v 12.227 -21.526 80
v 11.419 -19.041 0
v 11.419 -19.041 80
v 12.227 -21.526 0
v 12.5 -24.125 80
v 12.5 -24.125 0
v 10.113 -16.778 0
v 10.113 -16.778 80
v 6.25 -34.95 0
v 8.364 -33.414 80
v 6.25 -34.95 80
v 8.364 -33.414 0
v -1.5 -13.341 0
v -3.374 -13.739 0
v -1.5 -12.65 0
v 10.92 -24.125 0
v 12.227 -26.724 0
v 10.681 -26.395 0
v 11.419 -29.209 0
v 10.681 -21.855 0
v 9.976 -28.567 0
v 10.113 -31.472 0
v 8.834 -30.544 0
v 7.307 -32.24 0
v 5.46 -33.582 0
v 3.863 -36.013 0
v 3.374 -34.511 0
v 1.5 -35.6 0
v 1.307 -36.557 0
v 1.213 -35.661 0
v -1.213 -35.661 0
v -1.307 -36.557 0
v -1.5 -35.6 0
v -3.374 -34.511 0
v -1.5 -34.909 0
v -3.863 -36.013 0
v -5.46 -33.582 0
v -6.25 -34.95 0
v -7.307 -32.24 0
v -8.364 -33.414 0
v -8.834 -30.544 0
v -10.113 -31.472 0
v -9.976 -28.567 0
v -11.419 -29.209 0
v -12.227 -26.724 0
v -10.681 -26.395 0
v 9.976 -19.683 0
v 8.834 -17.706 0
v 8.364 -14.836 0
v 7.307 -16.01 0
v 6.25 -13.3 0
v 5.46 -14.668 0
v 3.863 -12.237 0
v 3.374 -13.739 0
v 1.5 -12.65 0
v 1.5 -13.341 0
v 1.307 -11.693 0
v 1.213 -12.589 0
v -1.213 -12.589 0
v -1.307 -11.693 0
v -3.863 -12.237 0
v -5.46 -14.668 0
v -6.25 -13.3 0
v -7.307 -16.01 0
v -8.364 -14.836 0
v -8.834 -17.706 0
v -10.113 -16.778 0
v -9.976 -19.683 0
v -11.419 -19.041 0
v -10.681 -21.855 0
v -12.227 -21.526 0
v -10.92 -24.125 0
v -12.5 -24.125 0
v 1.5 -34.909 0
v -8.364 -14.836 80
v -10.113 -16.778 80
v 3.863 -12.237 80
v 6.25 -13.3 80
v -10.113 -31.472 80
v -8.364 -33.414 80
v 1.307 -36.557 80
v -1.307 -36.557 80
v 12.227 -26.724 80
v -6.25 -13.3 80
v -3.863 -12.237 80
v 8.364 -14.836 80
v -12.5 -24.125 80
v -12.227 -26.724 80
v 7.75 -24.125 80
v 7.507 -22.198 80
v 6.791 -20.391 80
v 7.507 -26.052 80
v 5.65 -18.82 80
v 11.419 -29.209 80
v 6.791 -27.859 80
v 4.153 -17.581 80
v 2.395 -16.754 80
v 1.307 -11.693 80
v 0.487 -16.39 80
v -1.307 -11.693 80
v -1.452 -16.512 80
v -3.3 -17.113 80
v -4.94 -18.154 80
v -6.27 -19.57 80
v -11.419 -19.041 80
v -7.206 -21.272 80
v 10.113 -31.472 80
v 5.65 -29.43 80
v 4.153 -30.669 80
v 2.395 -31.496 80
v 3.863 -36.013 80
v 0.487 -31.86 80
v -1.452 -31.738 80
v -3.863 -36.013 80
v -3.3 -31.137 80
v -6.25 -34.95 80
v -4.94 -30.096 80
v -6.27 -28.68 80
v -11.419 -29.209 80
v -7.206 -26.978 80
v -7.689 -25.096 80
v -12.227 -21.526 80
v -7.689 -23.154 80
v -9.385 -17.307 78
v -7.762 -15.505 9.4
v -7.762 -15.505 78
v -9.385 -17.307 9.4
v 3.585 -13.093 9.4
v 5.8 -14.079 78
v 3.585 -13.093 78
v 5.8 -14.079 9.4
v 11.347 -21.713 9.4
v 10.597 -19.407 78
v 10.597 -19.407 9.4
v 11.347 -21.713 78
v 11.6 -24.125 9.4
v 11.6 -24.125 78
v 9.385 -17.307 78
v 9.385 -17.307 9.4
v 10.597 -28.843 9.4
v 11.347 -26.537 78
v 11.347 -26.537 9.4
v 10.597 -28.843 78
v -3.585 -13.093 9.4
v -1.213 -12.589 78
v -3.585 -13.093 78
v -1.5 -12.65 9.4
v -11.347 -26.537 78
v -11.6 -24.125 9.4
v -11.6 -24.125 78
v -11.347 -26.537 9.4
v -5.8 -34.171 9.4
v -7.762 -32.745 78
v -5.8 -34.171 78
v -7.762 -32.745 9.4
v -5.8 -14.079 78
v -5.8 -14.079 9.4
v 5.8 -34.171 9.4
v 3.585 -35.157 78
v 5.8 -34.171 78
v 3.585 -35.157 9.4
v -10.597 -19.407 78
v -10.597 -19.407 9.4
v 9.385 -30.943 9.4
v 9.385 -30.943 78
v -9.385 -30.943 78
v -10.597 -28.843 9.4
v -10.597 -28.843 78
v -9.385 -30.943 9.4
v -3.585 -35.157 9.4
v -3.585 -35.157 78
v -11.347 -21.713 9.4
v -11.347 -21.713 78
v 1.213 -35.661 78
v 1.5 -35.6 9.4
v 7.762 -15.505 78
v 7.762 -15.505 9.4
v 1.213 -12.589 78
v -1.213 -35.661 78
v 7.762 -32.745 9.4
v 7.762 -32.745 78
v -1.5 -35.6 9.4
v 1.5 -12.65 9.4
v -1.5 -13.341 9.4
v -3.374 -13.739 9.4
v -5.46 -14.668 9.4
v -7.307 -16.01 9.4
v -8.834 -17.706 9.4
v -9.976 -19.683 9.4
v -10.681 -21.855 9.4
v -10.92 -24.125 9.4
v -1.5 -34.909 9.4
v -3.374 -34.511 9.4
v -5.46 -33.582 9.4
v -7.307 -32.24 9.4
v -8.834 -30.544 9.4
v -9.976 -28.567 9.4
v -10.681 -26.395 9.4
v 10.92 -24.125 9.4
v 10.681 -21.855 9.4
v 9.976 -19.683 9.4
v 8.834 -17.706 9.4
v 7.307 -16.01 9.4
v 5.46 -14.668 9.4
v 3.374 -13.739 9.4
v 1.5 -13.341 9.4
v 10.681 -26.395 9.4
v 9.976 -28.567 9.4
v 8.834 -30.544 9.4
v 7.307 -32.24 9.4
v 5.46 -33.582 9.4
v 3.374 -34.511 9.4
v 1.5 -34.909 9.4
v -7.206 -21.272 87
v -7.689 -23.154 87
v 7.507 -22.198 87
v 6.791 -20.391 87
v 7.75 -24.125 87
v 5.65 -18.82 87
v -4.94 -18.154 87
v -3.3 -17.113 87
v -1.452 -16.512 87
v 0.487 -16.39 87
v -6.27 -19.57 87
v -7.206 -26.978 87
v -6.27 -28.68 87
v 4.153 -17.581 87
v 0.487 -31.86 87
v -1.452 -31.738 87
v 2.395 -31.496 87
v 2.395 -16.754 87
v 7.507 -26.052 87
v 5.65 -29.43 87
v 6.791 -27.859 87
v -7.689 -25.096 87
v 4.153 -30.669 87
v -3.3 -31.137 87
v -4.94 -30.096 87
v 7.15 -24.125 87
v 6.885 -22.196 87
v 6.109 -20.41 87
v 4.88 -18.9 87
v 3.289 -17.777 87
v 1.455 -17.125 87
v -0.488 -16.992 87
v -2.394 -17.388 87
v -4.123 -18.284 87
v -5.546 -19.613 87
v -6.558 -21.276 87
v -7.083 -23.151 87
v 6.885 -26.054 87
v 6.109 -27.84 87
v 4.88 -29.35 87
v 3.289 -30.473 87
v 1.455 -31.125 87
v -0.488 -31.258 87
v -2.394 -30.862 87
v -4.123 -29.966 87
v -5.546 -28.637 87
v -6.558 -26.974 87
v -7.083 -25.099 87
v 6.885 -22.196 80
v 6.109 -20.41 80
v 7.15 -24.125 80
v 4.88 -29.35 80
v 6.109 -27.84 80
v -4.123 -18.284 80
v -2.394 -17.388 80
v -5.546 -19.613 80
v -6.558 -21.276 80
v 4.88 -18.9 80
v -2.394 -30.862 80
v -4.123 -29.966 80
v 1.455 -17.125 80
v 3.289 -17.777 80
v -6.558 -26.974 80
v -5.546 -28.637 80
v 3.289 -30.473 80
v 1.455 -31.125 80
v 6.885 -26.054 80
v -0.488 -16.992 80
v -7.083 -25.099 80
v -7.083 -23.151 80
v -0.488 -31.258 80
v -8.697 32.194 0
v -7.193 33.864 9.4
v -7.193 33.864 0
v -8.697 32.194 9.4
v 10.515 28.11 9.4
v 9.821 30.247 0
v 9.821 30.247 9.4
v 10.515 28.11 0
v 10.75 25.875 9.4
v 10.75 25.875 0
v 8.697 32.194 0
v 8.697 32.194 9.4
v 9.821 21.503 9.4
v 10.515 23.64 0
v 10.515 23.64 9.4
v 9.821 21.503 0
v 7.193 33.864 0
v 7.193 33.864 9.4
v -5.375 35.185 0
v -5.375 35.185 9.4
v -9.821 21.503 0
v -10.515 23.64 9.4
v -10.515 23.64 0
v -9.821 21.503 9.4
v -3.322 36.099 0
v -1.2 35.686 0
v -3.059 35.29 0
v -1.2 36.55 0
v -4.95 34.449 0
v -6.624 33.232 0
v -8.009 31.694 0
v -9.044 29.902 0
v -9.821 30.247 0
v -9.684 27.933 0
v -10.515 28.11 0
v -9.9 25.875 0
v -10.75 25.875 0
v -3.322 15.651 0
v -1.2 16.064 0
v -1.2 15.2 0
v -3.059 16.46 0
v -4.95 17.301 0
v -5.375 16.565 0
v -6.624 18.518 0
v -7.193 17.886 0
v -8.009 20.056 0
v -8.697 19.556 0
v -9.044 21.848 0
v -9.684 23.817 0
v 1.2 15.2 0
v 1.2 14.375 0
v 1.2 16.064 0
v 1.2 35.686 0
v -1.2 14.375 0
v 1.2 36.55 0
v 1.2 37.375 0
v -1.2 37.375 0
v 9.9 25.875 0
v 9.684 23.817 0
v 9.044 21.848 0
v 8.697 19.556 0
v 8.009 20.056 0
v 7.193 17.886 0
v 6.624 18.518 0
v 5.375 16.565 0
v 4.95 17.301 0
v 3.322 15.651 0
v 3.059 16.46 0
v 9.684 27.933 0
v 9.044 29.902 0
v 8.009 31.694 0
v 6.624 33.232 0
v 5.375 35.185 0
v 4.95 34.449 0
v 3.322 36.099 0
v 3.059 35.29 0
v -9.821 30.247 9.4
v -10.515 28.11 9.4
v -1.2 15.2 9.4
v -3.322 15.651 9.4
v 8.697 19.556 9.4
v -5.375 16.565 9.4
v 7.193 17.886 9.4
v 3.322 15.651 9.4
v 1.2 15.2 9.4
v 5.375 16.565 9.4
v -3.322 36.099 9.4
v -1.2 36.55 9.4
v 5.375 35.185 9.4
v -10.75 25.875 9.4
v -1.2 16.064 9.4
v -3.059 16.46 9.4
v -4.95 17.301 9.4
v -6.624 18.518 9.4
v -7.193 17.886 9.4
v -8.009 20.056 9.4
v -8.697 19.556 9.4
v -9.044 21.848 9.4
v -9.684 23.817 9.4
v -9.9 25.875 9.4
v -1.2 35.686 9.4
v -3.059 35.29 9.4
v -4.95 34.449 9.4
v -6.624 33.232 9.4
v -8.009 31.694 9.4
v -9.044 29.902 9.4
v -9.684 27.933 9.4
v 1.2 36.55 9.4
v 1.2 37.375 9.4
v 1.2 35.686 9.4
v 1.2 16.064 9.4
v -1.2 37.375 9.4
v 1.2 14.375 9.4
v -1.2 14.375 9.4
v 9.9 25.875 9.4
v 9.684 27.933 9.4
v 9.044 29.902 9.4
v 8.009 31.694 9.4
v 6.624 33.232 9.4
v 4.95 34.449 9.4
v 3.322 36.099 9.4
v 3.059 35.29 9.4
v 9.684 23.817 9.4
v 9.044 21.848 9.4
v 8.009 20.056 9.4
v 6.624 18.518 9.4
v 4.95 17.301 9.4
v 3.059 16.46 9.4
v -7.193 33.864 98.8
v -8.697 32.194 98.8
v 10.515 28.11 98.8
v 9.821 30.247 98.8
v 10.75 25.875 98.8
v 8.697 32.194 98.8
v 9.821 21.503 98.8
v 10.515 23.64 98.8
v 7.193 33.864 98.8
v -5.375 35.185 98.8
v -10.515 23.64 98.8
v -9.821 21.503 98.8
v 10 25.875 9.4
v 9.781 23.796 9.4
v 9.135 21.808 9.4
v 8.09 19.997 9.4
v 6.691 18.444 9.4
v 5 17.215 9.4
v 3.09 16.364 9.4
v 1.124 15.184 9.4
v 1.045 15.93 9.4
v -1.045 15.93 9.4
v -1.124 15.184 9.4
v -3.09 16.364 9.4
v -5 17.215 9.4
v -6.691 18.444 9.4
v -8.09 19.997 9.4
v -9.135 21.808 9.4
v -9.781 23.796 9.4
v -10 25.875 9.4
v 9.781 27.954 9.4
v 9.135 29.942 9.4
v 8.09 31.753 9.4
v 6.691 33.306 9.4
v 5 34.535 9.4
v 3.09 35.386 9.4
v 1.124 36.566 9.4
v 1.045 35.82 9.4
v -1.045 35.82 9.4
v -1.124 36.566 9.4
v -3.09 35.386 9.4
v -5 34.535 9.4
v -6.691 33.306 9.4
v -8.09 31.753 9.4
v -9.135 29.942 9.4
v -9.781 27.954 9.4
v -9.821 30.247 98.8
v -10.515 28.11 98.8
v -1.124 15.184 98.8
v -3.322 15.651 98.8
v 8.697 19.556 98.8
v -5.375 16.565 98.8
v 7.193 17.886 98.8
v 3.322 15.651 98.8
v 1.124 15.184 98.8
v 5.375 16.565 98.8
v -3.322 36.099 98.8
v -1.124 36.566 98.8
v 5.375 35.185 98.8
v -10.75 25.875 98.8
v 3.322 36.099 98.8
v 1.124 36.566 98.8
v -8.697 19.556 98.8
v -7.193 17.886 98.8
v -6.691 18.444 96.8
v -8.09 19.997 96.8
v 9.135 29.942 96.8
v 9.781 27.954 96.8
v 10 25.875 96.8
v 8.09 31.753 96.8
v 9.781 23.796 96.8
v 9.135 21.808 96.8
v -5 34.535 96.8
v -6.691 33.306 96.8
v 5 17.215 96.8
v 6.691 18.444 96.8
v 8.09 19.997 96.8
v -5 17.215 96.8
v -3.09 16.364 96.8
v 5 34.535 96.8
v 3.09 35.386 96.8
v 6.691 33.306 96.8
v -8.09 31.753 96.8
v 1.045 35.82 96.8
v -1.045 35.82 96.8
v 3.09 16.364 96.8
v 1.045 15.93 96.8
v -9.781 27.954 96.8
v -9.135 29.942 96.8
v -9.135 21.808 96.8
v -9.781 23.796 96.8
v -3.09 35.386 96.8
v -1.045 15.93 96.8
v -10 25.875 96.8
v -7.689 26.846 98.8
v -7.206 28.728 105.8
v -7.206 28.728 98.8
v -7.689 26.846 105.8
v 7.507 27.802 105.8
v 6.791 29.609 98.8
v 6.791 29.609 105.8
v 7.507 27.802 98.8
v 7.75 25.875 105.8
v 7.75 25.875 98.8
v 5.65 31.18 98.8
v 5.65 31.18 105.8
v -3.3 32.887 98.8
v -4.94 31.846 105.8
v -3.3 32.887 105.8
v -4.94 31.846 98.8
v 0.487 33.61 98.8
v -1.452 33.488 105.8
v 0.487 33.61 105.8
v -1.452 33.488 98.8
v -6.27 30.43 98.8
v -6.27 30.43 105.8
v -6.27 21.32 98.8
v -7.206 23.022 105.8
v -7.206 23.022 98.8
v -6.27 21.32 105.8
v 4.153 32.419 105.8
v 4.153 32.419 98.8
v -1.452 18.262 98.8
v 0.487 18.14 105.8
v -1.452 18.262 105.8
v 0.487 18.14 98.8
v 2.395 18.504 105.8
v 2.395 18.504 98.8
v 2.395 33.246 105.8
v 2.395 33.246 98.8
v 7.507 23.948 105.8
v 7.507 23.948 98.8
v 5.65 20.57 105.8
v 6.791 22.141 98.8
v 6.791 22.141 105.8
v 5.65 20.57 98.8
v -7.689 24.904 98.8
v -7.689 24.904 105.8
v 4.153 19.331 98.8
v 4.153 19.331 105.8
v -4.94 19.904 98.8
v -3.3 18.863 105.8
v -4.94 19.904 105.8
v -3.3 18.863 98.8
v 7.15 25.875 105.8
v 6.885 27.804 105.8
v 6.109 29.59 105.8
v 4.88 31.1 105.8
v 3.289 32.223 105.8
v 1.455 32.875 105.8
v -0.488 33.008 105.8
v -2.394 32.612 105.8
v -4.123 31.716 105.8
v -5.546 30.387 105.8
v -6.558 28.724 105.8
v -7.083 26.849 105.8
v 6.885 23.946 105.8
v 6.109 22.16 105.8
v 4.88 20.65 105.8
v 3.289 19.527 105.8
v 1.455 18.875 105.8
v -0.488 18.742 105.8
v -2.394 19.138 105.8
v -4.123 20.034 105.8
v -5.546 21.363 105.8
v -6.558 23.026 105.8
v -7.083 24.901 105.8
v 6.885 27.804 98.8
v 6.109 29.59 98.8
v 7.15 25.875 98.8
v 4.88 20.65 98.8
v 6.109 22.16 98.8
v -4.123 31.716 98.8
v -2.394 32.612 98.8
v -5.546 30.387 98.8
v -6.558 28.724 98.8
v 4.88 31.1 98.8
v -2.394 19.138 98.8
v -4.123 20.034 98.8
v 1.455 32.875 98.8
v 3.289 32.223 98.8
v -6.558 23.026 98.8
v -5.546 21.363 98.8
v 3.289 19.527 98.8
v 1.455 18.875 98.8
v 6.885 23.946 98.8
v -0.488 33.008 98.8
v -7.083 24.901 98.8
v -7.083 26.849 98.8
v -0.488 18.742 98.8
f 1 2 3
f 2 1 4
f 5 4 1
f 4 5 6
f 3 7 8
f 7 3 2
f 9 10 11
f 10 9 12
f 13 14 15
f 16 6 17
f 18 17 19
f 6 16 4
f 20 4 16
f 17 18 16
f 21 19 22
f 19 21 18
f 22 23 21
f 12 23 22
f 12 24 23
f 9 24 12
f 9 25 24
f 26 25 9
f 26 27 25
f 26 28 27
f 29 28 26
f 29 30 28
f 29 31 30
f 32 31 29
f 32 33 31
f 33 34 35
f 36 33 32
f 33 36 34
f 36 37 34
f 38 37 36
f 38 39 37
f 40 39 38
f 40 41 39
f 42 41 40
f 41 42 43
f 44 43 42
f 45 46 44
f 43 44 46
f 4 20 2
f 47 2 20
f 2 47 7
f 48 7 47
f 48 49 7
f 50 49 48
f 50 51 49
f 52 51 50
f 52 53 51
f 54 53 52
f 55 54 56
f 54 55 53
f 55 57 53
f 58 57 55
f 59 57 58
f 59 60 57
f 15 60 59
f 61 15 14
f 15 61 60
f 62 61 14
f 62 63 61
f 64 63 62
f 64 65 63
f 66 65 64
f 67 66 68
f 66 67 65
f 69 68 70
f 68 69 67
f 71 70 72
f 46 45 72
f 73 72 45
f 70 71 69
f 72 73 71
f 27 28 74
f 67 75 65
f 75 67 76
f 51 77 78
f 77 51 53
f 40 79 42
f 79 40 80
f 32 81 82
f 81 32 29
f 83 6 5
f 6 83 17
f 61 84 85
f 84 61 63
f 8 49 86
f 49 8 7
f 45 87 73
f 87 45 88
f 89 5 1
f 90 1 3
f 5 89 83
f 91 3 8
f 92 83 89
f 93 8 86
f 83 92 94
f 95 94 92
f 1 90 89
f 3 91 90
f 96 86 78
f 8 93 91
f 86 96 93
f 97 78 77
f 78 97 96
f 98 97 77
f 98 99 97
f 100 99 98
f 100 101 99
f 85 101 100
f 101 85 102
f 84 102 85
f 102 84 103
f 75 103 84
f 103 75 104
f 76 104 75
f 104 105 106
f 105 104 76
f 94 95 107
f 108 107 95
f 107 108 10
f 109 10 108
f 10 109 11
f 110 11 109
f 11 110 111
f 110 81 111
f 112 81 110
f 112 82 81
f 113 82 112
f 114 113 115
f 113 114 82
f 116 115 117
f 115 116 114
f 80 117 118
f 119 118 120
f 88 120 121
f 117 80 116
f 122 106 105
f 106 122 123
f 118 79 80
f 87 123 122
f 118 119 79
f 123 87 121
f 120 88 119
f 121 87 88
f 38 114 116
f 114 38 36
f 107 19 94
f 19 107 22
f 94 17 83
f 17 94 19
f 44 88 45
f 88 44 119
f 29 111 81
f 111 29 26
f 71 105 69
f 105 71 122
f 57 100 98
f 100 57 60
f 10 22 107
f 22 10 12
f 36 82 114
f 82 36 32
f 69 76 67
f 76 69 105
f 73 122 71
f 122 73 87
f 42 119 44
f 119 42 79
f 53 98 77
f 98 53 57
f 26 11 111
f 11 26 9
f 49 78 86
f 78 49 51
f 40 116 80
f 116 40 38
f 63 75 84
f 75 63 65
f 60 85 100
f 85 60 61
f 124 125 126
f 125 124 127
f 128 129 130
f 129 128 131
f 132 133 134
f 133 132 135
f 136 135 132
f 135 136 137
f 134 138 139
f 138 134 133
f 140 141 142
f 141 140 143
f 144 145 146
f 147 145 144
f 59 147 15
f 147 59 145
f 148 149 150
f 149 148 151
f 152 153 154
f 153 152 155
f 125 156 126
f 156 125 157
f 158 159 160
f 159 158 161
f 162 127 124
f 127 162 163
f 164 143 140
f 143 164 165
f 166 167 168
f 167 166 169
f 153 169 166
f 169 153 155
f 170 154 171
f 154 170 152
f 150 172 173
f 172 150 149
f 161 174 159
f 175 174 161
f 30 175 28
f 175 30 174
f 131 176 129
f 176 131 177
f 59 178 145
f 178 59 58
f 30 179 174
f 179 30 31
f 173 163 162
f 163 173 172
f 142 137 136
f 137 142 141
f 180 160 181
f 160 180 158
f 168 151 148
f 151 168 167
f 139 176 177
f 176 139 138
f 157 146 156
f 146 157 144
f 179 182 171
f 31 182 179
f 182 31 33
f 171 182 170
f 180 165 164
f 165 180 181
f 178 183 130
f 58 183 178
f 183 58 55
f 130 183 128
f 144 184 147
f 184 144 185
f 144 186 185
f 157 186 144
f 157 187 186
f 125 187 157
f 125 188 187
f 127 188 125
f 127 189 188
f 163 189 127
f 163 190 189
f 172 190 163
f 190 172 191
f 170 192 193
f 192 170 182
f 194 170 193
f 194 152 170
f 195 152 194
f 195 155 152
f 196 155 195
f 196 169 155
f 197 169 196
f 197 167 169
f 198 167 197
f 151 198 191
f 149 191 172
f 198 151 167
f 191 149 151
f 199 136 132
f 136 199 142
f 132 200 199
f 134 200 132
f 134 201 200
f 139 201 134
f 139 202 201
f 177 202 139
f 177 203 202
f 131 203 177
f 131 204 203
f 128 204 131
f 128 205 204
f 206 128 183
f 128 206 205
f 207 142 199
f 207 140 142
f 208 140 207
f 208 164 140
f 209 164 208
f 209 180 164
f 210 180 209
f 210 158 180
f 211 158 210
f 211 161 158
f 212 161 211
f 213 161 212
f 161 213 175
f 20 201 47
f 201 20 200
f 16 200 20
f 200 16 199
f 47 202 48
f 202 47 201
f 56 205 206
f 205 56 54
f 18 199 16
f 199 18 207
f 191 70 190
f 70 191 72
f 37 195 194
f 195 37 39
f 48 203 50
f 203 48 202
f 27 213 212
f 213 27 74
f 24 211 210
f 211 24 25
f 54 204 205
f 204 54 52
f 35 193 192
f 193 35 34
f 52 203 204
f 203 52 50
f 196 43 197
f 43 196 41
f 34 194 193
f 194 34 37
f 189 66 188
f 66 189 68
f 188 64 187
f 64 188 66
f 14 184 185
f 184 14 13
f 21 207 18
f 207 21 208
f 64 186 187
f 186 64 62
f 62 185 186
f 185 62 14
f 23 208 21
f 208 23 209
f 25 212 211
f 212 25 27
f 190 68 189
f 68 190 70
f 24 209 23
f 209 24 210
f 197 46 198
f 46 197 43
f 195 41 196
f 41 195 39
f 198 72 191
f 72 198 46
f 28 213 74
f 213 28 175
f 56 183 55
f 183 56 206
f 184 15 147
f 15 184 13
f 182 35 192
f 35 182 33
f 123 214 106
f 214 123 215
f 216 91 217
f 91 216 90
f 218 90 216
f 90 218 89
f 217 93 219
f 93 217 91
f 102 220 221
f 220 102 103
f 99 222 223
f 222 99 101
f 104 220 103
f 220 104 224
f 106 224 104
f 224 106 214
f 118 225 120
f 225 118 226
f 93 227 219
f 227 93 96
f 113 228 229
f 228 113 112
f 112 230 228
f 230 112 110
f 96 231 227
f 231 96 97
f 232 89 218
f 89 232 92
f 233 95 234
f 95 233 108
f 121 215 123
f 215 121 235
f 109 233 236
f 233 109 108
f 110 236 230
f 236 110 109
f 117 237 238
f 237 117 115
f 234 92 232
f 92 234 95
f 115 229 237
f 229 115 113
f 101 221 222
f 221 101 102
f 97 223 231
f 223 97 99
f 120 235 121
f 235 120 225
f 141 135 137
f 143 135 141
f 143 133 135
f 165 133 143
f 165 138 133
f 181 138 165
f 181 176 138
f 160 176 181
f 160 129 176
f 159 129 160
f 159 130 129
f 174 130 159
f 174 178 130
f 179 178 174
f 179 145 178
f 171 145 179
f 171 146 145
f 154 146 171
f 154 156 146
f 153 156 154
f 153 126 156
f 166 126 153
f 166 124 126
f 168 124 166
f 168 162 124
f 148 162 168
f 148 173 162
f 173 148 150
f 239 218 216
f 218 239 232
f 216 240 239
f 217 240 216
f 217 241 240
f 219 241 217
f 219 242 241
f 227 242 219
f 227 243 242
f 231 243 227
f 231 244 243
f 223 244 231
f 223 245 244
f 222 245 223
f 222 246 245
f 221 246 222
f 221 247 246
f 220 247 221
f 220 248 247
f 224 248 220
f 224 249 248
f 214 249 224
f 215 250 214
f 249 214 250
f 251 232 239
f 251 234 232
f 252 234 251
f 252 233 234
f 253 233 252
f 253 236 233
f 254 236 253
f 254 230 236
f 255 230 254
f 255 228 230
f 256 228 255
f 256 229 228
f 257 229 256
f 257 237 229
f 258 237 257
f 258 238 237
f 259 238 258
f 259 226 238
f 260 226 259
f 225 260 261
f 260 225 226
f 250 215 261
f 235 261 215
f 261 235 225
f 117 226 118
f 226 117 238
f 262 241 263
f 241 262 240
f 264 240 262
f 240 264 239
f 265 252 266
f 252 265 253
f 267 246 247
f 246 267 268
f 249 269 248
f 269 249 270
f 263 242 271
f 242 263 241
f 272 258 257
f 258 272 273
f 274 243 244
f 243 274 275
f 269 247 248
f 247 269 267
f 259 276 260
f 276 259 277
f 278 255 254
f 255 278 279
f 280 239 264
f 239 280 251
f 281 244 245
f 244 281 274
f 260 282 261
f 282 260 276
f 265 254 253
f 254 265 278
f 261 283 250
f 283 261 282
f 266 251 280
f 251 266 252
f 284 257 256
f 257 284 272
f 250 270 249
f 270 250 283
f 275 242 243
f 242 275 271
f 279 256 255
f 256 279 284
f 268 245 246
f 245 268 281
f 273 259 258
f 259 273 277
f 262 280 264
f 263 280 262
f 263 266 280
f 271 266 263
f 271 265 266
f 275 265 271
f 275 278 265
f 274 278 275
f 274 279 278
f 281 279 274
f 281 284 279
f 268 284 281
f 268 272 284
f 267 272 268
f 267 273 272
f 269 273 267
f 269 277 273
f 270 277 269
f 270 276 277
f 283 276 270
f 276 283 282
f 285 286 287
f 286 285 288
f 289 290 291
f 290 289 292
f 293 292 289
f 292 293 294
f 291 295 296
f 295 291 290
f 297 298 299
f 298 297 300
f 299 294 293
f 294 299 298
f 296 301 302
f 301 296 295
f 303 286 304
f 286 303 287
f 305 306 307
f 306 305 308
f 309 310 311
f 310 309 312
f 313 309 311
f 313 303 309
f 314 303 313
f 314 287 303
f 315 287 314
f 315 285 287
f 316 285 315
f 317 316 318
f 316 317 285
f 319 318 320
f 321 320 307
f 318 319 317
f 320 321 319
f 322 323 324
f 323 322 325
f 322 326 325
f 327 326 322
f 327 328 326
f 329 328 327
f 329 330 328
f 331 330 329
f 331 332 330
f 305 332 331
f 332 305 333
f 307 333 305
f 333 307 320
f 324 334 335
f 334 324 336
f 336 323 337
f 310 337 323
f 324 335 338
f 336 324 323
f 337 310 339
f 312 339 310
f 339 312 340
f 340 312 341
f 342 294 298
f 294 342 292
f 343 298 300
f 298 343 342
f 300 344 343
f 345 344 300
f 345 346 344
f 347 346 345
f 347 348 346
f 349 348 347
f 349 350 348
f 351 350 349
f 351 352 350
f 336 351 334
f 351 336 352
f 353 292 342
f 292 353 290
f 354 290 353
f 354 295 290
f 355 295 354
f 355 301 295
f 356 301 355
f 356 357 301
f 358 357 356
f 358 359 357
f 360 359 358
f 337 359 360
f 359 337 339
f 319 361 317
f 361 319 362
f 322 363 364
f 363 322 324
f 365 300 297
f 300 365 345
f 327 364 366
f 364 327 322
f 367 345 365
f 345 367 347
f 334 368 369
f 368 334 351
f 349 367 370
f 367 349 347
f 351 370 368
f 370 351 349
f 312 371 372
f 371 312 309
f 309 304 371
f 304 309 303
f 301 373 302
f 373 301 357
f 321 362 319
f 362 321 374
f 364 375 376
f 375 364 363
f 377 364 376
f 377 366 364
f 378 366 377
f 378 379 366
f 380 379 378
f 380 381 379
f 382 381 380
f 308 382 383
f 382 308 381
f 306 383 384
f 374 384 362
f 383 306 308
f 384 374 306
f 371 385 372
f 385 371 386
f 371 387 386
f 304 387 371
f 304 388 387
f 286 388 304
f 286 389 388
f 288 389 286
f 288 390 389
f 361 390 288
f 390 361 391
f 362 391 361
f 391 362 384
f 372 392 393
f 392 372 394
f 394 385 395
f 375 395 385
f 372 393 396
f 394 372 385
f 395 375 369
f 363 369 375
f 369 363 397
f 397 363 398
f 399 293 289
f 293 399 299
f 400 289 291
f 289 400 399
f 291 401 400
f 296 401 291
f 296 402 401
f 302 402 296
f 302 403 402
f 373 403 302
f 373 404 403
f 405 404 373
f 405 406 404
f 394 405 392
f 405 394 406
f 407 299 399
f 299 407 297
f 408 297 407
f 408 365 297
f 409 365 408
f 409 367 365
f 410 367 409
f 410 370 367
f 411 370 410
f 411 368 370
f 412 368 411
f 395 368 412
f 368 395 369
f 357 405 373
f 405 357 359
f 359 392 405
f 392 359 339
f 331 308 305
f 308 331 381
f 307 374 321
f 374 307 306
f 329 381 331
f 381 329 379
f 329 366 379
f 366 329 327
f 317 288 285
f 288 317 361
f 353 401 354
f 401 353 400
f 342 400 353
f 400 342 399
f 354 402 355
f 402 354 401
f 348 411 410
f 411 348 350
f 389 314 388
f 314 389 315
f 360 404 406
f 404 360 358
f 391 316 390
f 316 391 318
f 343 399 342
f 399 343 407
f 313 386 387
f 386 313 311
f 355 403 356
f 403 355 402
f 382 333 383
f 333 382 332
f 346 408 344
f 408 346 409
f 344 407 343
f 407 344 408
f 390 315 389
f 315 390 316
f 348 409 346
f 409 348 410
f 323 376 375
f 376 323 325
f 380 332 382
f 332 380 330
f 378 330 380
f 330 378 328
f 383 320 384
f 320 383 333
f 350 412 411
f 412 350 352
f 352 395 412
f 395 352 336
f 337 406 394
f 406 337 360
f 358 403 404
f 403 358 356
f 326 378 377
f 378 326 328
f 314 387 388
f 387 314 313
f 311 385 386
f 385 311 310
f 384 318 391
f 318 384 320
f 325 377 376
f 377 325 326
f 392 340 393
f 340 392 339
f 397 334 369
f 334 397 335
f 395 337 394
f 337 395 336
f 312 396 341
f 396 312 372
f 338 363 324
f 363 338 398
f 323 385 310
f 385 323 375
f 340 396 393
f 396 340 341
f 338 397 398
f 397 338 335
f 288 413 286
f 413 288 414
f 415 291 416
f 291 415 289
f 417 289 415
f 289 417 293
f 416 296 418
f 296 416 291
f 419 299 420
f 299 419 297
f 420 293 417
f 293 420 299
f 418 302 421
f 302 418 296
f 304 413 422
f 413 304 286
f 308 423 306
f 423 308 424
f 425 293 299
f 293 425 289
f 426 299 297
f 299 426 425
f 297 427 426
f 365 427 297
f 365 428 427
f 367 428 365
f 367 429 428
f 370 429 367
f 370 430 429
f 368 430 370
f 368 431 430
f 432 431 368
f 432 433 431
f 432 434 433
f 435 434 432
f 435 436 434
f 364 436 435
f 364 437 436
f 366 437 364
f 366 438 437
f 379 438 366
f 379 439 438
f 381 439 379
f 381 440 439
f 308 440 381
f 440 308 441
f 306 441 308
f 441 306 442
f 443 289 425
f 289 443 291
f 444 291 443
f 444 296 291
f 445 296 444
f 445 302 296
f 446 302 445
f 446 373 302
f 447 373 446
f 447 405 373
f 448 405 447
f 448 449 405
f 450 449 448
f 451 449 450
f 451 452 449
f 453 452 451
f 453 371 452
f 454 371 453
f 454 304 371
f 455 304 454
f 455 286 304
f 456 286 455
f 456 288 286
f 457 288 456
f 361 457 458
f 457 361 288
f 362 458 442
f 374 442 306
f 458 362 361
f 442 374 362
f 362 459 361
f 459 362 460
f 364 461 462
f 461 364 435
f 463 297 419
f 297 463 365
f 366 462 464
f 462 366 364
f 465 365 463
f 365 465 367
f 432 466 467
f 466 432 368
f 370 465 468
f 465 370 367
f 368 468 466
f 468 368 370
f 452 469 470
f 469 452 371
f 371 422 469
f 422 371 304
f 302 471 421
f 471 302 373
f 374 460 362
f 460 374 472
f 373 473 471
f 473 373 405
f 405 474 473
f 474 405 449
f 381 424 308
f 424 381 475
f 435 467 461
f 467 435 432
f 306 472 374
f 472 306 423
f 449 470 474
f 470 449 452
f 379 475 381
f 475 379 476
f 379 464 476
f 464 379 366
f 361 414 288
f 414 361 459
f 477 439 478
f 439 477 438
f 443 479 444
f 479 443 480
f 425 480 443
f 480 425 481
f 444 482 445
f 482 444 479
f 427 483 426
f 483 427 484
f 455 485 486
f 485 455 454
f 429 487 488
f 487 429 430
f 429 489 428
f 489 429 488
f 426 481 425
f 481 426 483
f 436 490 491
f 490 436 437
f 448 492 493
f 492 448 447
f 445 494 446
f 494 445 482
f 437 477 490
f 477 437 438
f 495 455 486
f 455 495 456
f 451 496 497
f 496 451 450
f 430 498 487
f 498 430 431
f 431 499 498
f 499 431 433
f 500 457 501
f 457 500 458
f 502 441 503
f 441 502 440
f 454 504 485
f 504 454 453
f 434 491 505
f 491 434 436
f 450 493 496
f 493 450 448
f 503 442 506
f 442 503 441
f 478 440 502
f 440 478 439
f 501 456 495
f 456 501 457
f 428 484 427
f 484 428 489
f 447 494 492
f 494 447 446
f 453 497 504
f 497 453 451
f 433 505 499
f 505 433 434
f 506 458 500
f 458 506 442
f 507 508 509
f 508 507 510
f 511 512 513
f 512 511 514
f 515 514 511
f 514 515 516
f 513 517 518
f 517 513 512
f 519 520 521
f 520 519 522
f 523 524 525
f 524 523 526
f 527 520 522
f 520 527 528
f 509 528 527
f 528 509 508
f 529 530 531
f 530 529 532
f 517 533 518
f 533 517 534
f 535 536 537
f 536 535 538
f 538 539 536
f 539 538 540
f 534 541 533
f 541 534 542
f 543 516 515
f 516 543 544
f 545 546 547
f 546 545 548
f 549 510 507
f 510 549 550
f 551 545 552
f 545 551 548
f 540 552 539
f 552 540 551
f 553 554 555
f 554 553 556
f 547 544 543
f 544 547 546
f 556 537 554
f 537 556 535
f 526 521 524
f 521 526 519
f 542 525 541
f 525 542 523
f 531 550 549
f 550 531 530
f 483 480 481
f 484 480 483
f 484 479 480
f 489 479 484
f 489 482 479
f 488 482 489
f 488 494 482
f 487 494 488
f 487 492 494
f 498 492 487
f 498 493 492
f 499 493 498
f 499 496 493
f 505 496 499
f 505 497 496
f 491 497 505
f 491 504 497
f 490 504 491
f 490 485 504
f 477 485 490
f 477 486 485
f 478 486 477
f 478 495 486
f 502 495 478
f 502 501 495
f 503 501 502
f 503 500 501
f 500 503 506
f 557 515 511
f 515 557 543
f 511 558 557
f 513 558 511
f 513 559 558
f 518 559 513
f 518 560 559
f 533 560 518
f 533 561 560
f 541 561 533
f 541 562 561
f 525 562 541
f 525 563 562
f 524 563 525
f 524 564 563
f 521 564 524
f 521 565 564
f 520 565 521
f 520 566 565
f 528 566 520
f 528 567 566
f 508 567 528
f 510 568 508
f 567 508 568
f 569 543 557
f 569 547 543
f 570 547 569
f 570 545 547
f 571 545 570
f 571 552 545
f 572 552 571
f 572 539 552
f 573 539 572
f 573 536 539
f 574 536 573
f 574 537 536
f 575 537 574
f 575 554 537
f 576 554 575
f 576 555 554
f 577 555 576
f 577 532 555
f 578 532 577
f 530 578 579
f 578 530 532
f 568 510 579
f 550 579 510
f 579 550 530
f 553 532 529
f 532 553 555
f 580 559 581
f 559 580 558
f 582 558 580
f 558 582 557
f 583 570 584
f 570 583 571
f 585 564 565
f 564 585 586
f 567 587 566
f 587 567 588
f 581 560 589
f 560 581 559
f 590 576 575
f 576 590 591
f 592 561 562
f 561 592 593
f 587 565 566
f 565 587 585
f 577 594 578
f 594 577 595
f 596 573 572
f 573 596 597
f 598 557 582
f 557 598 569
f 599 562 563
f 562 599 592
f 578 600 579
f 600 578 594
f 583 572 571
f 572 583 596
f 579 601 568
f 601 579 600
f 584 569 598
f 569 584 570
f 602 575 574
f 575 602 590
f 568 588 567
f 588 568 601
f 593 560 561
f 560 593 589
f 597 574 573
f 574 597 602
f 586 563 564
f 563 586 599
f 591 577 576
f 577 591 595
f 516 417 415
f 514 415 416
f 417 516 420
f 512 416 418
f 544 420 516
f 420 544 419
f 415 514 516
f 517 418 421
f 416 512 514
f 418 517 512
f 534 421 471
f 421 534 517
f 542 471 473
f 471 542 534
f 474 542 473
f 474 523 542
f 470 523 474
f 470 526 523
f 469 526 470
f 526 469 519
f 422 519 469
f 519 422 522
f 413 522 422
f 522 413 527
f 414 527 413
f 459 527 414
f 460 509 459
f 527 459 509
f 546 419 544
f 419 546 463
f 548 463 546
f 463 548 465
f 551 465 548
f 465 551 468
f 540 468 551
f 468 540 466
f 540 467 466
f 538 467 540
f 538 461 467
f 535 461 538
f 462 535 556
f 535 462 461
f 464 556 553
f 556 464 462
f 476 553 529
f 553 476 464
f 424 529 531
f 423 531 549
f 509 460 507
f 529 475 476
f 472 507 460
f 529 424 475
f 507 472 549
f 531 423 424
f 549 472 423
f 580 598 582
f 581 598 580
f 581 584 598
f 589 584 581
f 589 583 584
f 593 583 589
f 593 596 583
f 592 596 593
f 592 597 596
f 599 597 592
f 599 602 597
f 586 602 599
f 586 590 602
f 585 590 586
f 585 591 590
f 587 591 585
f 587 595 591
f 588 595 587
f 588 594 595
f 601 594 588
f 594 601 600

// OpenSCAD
lg_dia = 25; 	// large cylinder diameter
lg_len = 80; 	// large cylinder length
lg_d = 1.8;		// large cylinder thickness

cap_dia = 15.5;
cap_len = 7;
cap_d = 1.2;

total_len = 160; // total length

sp_len = 68;	// spring length

/*
 * This generates the height of the interlocking piece.
 * It is designed to achieve 90% compression of the spring
 */
lock_h = (lg_len - ((sp_len) * .9))/2;

sm_dia = 21.5;	// small cylinder diameter
sm_len = total_len - lg_len + lock_h;	// small cylinder length
sm_d = 1.5;		// small cylinder thickness

key_sz = 3; // Thickness of the interlocking piece

/*
 * Hollow tube
 */
module tube(len,dia,thick) {
	difference() {
		cylinder(len,d=dia,dia/2);
		translate([0,0,-5]) {
			cylinder(len+10,d=(dia-thick),(dia-thick)/2);
		};
	};
};

/*
 * Endcap where tube attaches to holder
 */
module endcap(base_thick=2, base_dia, dia, height) {
	cylinder(base_thick, d=base_dia, base_dia/2);
	tube(cap_len+base_thick,cap_dia,cap_d);
}

/*
 * Simple interlocking piece
 */
module tube_lock(height,outer_dia,inner_dia,key_size) {
	difference() {
		tube(height,outer_dia,(outer_dia-inner_dia)*.8);
		translate([-key_size/2,-(outer_dia+10)/2,-5]) {
			cube([key_size,outer_dia+10,height+10]);
		};
	}
}

/*
 * Simple key
 */
module tube_key(height,outer_dia,inner_dia,key_size) {
	/* set to 90% thickness of difference between outer and inner tube */
	tube(height,inner_dia,outer_dia-inner_dia);
	translate([-(key_size*.8)/2,-(outer_dia-.2)/2,0]) {
		cube([key_size*.8,outer_dia-.2,height]);
	}
}

module big_tube() {
	union() {
		tube(lg_len, lg_dia, lg_d);
		tube_lock(lock_h,lg_dia-lg_d,sm_dia,key_sz);
		translate([0,0,lg_len-2]) {
			endcap(2, lg_dia, cap_dia, cap_len);
		}
	}
}

module small_tube() {
	union() {
		tube_key(lock_h,lg_dia-lg_d,sm_dia,key_sz);
		translate([0,0,lock_h]) {
			tube(sm_len, sm_dia, sm_d);
			translate([0,0,sm_len-2]) {
				endcap(2, sm_dia, cap_dia, cap_len);
			}
		}
	}
}		

translate([0,-(lg_dia/2+sm_dia/2+25)/2,0]) {
	big_tube();
	translate([0,50,0]) {
		small_tube();
	}
}
